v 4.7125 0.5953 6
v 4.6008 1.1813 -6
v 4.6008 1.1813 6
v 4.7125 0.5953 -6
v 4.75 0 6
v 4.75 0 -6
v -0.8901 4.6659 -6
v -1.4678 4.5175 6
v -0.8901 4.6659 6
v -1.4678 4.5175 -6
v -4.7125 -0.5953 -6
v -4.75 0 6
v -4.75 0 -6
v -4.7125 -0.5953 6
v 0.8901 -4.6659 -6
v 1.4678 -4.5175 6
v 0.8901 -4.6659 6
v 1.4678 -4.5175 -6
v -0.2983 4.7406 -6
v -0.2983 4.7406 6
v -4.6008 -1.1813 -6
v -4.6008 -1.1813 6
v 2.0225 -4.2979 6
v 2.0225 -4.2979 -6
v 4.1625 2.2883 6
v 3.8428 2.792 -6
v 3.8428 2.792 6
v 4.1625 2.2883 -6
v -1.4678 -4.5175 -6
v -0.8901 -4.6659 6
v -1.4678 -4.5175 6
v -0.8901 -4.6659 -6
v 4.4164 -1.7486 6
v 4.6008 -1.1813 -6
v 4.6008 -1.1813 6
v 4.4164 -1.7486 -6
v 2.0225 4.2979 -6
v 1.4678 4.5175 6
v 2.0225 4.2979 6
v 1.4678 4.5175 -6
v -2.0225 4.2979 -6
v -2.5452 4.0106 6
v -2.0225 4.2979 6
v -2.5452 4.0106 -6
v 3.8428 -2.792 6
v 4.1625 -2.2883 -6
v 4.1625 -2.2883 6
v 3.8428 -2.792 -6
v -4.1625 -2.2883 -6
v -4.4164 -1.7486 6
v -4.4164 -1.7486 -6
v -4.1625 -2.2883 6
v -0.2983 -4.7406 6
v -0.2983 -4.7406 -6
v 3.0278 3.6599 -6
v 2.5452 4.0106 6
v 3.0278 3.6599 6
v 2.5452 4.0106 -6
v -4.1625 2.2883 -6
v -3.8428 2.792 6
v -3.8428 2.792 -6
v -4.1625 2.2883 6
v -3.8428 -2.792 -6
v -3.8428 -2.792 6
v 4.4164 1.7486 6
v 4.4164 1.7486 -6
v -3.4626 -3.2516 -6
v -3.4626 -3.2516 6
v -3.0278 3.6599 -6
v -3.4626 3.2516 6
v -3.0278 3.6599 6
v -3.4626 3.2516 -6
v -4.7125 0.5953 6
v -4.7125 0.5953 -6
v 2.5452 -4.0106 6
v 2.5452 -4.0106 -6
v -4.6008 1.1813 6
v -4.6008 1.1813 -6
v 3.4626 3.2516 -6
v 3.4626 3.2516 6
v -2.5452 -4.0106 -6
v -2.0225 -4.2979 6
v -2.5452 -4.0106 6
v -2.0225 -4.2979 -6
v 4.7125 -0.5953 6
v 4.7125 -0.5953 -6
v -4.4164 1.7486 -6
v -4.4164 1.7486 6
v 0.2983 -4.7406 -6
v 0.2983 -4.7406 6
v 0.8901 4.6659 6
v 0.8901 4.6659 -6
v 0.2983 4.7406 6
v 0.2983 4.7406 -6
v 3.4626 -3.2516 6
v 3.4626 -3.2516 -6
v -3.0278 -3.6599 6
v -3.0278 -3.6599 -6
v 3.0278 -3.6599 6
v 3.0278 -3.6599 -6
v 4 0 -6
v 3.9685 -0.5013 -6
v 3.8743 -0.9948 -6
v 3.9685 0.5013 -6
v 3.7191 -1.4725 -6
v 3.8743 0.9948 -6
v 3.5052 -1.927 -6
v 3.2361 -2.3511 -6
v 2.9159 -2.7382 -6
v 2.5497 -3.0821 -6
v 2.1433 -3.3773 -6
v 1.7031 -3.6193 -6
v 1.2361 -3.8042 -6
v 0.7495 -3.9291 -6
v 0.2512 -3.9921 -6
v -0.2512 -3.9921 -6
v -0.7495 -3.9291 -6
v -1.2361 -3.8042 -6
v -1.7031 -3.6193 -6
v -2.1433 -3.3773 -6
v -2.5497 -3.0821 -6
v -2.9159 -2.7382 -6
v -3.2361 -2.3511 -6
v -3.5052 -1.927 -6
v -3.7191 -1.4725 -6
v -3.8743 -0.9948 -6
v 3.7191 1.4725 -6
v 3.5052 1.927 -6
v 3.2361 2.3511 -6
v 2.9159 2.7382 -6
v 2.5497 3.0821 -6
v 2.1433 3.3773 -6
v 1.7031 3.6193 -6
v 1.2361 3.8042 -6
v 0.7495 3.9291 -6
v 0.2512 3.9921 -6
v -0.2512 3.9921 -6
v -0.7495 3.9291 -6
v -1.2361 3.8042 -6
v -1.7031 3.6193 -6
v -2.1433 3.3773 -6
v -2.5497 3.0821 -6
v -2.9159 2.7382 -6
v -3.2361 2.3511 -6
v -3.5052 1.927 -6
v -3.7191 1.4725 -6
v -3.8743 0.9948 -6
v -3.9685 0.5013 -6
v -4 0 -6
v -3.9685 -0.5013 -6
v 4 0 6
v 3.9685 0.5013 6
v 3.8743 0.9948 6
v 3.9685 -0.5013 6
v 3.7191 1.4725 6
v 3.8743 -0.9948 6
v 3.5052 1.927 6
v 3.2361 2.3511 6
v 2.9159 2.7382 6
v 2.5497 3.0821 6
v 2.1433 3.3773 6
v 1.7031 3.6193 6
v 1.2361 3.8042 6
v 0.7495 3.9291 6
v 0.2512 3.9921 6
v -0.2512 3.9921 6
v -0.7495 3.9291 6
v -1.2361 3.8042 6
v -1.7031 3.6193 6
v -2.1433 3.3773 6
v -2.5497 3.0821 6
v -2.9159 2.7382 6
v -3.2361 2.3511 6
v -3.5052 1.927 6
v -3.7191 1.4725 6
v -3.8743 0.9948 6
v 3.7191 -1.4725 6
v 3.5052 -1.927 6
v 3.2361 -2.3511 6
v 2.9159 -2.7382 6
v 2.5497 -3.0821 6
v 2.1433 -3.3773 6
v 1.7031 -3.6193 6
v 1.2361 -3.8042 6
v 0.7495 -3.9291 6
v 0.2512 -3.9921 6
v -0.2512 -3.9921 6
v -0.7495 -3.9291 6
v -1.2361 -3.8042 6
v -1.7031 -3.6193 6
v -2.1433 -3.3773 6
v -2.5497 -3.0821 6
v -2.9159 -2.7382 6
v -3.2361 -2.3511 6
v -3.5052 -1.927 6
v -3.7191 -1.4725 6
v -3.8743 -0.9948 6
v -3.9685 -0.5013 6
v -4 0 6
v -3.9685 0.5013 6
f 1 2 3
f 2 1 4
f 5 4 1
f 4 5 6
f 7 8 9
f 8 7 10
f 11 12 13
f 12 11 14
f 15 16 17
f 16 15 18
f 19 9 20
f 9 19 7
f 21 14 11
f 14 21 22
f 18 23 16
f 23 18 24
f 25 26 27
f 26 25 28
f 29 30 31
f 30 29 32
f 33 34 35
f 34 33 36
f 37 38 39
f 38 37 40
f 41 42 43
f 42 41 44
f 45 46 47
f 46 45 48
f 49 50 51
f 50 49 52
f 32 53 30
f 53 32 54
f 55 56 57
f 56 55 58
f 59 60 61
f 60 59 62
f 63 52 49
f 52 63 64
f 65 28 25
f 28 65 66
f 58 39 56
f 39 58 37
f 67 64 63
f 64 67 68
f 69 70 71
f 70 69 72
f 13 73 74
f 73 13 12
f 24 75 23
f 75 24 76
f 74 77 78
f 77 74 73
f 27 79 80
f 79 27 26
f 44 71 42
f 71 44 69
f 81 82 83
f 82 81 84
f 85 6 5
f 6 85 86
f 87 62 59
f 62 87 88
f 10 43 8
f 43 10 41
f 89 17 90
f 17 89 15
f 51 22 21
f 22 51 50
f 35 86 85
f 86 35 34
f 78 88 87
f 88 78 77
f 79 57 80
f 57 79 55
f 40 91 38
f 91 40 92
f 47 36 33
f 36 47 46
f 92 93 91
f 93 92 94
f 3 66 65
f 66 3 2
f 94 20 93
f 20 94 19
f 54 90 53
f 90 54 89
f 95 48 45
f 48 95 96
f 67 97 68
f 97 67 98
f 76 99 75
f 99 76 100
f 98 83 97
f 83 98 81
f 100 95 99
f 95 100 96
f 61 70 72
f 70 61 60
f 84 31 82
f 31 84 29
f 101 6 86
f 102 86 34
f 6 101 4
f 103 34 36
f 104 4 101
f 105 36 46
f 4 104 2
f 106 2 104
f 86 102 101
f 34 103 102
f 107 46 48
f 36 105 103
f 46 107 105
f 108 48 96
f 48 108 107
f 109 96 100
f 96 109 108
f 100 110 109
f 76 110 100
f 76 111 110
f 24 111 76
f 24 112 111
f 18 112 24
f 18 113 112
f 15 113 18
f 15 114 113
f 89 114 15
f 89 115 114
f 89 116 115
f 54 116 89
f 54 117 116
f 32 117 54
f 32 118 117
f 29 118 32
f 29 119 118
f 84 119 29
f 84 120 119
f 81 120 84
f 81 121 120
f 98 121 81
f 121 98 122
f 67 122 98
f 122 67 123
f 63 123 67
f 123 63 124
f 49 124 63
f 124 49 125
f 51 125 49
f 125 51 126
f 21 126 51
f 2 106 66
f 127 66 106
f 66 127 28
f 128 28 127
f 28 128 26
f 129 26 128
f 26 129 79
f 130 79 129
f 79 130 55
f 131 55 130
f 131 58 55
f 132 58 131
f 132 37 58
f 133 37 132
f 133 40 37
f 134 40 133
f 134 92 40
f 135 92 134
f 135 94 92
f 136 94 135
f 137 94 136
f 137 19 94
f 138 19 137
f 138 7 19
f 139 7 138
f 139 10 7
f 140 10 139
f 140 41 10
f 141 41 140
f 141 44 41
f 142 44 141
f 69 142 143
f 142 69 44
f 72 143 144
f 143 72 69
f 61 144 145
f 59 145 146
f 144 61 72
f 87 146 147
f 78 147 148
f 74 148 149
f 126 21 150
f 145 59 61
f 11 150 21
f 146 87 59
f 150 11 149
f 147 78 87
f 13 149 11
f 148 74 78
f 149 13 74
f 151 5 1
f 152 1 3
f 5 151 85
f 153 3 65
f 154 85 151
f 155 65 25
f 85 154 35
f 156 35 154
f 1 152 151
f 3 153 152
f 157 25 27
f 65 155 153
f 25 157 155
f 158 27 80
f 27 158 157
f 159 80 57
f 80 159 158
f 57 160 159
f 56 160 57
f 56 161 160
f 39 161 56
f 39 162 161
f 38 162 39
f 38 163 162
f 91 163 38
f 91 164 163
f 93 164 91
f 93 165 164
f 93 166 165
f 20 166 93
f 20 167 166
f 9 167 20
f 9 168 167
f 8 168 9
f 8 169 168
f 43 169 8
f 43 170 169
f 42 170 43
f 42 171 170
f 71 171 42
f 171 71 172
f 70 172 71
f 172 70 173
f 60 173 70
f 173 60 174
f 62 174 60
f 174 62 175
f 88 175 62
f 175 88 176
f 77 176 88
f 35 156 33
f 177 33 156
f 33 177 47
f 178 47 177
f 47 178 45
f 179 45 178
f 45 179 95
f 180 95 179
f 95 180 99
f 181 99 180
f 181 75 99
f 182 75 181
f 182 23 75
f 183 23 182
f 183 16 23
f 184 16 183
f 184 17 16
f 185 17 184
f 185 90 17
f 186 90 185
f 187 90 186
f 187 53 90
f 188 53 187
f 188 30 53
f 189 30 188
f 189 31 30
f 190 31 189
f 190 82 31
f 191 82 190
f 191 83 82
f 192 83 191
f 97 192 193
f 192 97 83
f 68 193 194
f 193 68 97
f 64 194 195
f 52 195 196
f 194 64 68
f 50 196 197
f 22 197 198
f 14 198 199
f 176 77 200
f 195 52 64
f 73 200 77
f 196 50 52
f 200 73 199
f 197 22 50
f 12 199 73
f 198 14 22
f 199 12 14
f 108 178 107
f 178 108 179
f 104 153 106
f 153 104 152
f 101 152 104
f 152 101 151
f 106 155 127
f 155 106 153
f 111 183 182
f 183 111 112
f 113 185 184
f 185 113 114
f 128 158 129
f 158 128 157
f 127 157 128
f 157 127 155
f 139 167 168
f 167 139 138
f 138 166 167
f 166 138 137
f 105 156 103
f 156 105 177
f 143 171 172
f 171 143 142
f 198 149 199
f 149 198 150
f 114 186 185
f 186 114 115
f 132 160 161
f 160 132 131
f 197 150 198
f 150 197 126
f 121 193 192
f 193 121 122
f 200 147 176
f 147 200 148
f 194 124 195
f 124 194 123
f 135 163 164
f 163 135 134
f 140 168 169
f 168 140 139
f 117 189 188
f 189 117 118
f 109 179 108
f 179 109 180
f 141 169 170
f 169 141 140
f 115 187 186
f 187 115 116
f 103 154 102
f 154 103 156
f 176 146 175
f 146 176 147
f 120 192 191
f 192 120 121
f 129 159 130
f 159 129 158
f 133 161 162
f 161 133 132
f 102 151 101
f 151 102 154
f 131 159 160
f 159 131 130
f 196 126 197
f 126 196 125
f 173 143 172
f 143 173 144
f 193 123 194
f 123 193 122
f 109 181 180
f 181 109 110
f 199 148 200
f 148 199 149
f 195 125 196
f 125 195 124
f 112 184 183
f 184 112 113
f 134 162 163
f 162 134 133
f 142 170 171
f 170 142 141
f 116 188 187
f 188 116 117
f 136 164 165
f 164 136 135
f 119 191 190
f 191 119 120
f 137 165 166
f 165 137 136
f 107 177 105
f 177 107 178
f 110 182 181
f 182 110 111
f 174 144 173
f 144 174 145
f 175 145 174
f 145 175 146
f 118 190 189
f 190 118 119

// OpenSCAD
$fn = 50;


difference() {
	union() {
		translate(v = [0, 0, -6.0000000000]) {
			cylinder(h = 12, r = 4.7500000000);
		}
	}
	union() {
		translate(v = [0, 0, -100.0000000000]) {
			cylinder(h = 200, r = 4.0000000000);
		}
	}
}
